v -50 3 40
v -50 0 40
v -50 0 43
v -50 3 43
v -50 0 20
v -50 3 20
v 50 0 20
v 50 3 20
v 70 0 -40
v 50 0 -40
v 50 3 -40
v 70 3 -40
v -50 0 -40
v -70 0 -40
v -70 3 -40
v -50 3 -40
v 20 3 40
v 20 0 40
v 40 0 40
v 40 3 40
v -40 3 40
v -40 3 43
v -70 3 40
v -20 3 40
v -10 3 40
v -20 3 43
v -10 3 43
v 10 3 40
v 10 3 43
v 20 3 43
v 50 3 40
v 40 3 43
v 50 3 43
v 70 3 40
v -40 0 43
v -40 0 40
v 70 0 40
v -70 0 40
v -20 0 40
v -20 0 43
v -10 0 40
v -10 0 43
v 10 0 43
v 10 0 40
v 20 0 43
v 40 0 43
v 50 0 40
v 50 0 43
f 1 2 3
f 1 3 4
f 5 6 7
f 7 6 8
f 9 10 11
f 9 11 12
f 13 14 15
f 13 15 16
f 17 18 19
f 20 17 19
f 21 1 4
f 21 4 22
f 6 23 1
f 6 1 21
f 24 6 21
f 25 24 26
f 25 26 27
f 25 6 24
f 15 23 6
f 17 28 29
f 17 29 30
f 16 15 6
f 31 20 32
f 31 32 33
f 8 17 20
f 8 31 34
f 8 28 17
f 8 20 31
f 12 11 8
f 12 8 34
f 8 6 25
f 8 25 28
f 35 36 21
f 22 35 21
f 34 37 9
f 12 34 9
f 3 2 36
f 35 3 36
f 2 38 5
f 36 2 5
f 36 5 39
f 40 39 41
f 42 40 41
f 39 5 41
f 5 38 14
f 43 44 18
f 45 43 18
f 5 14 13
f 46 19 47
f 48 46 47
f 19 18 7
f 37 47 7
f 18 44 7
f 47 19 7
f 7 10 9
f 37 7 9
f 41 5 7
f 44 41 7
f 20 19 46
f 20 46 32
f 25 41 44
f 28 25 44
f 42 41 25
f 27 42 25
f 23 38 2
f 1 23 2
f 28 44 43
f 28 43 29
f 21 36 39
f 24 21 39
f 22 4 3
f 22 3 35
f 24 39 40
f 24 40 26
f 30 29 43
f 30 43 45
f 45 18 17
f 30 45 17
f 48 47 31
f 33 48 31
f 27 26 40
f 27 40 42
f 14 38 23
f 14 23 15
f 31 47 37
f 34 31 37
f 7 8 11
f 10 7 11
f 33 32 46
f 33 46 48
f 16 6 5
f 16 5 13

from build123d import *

# Parameters (mm, degrees)
SKETCH1_W           = 140
SKETCH1_H           = 80
BOSS_EXTRUDE1_DEPTH = 3
SKETCH2_W           = 100
SKETCH2_H           = 60
CUT_EXTRUDE1_DEPTH  = 13
SKETCH4_W           = 10
SKETCH4_H           = 3
BOSS_EXTRUDE2_DEPTH = 3


with BuildPart() as part:
    # Sketch1 → Boss-Extrude1 (new body)
    with BuildSketch(Plane(origin=(0, 0, 0), x_dir=(1, 0, 0), z_dir=(0, 1, 0))):
        Rectangle(SKETCH1_W, SKETCH1_H)
    extrude(amount=BOSS_EXTRUDE1_DEPTH)

    # Sketch2 → Cut-Extrude1 (cut)
    with BuildSketch(Plane(origin=(0, 3, 0), x_dir=(1, 0, 0), z_dir=(0, 1, 0))):
        with Locations((0, 10)):
            Rectangle(SKETCH2_W, SKETCH2_H)
    extrude(amount=-CUT_EXTRUDE1_DEPTH, mode=Mode.SUBTRACT)

    # Sketch4 → Boss-Extrude2 (add)
    with BuildSketch(Plane.XY.offset(40)):
        with Locations((-45, 1.5)):
            Rectangle(SKETCH4_W, SKETCH4_H)
        with Locations((-15, 1.5)):
            Rectangle(SKETCH4_W, SKETCH4_H)
        with Locations((15, 1.5)):
            Rectangle(SKETCH4_W, SKETCH4_H)
        with Locations((45, 1.5)):
            Rectangle(SKETCH4_W, SKETCH4_H)
    extrude(amount=BOSS_EXTRUDE2_DEPTH)


solid = part.part
